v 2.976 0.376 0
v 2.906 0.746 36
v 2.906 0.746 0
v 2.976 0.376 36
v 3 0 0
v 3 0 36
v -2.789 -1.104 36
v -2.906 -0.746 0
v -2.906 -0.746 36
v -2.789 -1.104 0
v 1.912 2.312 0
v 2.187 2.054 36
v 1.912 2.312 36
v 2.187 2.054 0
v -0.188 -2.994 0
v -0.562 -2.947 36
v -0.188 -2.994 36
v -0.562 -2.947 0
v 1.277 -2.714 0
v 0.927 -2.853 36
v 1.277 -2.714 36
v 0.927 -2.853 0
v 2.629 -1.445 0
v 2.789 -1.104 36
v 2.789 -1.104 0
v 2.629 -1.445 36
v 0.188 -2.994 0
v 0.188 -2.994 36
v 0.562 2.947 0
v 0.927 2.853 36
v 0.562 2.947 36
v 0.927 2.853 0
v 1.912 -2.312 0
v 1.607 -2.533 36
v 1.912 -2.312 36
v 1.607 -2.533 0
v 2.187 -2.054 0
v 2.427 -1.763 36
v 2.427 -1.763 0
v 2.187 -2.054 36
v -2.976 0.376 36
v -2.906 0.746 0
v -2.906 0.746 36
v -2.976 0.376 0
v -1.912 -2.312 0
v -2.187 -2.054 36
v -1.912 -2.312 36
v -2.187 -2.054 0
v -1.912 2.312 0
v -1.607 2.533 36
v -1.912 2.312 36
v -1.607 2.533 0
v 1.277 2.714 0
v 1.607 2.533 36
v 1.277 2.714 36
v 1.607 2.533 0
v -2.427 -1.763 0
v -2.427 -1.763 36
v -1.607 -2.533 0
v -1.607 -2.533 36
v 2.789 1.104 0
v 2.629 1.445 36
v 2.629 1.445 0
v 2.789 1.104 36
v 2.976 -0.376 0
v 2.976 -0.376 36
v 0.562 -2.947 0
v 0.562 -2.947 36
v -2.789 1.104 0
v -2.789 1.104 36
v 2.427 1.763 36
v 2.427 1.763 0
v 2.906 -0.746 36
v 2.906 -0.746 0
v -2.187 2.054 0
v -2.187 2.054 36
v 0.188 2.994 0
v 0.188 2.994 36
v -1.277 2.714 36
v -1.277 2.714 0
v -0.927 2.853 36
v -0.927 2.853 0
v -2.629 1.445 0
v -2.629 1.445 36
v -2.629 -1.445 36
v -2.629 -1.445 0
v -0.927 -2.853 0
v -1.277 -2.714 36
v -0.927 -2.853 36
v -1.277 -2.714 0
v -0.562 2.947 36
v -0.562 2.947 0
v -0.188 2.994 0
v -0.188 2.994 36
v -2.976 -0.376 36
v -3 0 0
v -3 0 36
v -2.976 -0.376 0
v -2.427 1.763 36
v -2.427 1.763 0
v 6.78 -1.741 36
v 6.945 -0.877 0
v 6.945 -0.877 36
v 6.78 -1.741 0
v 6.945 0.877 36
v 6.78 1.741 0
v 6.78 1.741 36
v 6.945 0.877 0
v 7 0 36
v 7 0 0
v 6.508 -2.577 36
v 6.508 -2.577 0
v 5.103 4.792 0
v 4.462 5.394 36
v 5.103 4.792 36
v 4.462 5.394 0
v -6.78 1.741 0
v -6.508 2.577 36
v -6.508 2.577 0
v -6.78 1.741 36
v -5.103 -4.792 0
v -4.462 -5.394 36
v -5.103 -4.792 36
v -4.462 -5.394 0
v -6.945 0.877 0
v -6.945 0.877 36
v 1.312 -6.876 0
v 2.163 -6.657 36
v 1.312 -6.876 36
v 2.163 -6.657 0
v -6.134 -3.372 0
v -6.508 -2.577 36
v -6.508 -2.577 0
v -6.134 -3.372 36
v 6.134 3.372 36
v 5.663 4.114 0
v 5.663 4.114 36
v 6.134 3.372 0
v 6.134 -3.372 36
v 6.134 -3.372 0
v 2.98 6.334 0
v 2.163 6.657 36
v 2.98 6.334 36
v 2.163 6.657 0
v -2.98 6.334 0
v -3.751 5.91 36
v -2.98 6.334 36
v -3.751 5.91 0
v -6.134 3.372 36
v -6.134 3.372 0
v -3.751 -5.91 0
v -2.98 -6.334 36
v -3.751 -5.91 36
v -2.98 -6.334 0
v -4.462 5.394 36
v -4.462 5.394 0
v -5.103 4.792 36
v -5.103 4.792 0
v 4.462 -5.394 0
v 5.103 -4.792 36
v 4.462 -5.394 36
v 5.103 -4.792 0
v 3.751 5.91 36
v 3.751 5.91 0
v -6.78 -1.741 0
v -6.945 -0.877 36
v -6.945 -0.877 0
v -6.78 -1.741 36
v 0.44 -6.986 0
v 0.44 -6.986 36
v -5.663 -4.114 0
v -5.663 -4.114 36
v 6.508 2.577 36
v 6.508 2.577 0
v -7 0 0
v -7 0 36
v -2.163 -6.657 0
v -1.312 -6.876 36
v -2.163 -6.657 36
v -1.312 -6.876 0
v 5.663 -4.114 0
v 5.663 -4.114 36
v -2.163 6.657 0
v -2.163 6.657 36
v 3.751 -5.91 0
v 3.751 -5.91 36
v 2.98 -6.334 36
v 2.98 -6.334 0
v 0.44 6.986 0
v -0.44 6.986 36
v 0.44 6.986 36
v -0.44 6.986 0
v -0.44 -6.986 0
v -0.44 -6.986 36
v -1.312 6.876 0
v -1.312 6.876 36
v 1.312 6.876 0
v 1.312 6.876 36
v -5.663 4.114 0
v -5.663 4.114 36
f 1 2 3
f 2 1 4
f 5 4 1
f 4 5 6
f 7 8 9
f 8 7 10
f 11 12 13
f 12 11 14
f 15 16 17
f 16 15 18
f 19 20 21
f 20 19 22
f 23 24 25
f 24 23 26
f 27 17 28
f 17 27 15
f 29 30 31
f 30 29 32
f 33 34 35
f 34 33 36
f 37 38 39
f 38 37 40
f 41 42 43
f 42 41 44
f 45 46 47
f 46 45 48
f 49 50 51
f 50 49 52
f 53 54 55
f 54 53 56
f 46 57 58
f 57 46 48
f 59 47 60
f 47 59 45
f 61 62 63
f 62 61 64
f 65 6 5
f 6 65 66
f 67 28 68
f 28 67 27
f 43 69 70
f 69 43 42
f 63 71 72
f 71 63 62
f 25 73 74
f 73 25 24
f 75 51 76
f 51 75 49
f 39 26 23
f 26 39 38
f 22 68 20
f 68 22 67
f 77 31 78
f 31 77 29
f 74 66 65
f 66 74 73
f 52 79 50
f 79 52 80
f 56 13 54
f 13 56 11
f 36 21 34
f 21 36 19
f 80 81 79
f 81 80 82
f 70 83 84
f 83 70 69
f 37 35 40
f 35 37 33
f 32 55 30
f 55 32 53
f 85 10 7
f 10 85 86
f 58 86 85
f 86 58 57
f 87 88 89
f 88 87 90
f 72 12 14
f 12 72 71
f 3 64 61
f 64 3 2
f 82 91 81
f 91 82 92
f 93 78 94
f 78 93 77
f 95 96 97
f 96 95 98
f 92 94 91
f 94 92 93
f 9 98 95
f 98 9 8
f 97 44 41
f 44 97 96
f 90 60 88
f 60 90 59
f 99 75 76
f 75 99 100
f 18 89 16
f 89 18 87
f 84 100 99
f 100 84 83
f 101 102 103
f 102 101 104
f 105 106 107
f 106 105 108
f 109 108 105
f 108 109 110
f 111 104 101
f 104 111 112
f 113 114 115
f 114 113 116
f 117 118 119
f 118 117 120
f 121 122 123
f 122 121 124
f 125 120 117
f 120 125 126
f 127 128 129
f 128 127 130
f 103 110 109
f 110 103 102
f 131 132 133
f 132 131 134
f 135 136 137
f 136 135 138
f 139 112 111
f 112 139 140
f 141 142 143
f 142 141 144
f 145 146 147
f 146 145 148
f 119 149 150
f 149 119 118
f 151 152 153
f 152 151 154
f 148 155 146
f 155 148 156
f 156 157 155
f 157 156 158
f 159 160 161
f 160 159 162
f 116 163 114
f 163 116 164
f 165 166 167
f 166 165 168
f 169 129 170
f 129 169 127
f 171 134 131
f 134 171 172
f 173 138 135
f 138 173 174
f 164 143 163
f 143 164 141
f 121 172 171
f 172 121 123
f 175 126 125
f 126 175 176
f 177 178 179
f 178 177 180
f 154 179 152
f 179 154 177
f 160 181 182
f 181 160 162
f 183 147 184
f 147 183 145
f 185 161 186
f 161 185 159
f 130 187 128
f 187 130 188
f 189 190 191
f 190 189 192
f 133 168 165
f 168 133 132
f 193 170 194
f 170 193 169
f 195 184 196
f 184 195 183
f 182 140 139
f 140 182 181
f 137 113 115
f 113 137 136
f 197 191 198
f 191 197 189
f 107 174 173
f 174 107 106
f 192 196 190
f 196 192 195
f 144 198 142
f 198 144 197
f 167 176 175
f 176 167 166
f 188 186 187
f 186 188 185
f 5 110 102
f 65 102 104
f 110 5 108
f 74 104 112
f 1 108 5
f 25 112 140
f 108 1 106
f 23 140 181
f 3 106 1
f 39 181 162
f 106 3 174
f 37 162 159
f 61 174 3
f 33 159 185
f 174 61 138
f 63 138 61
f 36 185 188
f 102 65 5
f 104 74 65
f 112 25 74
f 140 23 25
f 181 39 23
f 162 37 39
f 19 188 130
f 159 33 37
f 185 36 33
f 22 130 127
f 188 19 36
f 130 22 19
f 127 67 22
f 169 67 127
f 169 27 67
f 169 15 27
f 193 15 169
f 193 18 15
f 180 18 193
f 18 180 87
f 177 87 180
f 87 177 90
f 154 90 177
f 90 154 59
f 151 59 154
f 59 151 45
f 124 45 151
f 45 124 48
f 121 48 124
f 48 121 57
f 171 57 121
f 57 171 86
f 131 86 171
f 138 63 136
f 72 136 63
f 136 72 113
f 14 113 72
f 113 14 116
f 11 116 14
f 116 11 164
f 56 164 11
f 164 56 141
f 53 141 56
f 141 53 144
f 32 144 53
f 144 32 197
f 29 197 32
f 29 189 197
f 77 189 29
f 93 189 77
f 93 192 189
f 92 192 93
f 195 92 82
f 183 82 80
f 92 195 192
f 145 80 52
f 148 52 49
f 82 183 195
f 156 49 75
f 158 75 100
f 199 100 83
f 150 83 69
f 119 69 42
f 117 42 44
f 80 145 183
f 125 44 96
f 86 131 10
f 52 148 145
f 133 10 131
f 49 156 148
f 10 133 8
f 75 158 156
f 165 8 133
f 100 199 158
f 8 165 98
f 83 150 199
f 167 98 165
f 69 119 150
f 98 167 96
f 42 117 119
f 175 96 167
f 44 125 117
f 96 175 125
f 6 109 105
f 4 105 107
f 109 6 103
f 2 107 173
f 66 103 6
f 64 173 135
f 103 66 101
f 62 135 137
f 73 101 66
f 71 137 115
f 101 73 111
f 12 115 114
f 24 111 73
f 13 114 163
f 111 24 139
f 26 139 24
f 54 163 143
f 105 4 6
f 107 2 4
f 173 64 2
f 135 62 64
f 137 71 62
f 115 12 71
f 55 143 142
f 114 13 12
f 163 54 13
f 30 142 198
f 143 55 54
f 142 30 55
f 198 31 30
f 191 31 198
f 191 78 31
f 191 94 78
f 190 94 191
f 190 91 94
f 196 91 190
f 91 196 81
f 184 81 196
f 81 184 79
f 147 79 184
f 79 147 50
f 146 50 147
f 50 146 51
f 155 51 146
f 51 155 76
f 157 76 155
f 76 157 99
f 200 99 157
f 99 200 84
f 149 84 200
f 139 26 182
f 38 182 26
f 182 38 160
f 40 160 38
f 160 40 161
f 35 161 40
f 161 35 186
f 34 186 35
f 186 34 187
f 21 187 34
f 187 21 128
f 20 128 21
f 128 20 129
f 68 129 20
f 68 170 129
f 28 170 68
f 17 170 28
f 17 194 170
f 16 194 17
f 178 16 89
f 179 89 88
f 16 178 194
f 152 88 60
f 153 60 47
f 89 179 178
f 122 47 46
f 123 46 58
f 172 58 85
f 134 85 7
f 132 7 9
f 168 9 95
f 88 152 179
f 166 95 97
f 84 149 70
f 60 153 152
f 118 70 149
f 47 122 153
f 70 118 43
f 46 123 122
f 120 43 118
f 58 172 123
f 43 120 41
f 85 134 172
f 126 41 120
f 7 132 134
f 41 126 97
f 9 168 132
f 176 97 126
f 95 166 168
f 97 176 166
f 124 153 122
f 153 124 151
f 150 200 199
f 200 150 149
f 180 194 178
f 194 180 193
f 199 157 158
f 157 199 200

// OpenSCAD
$fn = 50;

difference() {
	union() {
		cylinder(h = 36, r = 7.0);
	}
	union() {
		translate(v = [0, 0, -100]) {
			cylinder(h = 200, r = 3.0);
		}
		translate(v = [0, 0, -100]) {
			cylinder(h = 200, r = 1.5);
		}
	}
}
